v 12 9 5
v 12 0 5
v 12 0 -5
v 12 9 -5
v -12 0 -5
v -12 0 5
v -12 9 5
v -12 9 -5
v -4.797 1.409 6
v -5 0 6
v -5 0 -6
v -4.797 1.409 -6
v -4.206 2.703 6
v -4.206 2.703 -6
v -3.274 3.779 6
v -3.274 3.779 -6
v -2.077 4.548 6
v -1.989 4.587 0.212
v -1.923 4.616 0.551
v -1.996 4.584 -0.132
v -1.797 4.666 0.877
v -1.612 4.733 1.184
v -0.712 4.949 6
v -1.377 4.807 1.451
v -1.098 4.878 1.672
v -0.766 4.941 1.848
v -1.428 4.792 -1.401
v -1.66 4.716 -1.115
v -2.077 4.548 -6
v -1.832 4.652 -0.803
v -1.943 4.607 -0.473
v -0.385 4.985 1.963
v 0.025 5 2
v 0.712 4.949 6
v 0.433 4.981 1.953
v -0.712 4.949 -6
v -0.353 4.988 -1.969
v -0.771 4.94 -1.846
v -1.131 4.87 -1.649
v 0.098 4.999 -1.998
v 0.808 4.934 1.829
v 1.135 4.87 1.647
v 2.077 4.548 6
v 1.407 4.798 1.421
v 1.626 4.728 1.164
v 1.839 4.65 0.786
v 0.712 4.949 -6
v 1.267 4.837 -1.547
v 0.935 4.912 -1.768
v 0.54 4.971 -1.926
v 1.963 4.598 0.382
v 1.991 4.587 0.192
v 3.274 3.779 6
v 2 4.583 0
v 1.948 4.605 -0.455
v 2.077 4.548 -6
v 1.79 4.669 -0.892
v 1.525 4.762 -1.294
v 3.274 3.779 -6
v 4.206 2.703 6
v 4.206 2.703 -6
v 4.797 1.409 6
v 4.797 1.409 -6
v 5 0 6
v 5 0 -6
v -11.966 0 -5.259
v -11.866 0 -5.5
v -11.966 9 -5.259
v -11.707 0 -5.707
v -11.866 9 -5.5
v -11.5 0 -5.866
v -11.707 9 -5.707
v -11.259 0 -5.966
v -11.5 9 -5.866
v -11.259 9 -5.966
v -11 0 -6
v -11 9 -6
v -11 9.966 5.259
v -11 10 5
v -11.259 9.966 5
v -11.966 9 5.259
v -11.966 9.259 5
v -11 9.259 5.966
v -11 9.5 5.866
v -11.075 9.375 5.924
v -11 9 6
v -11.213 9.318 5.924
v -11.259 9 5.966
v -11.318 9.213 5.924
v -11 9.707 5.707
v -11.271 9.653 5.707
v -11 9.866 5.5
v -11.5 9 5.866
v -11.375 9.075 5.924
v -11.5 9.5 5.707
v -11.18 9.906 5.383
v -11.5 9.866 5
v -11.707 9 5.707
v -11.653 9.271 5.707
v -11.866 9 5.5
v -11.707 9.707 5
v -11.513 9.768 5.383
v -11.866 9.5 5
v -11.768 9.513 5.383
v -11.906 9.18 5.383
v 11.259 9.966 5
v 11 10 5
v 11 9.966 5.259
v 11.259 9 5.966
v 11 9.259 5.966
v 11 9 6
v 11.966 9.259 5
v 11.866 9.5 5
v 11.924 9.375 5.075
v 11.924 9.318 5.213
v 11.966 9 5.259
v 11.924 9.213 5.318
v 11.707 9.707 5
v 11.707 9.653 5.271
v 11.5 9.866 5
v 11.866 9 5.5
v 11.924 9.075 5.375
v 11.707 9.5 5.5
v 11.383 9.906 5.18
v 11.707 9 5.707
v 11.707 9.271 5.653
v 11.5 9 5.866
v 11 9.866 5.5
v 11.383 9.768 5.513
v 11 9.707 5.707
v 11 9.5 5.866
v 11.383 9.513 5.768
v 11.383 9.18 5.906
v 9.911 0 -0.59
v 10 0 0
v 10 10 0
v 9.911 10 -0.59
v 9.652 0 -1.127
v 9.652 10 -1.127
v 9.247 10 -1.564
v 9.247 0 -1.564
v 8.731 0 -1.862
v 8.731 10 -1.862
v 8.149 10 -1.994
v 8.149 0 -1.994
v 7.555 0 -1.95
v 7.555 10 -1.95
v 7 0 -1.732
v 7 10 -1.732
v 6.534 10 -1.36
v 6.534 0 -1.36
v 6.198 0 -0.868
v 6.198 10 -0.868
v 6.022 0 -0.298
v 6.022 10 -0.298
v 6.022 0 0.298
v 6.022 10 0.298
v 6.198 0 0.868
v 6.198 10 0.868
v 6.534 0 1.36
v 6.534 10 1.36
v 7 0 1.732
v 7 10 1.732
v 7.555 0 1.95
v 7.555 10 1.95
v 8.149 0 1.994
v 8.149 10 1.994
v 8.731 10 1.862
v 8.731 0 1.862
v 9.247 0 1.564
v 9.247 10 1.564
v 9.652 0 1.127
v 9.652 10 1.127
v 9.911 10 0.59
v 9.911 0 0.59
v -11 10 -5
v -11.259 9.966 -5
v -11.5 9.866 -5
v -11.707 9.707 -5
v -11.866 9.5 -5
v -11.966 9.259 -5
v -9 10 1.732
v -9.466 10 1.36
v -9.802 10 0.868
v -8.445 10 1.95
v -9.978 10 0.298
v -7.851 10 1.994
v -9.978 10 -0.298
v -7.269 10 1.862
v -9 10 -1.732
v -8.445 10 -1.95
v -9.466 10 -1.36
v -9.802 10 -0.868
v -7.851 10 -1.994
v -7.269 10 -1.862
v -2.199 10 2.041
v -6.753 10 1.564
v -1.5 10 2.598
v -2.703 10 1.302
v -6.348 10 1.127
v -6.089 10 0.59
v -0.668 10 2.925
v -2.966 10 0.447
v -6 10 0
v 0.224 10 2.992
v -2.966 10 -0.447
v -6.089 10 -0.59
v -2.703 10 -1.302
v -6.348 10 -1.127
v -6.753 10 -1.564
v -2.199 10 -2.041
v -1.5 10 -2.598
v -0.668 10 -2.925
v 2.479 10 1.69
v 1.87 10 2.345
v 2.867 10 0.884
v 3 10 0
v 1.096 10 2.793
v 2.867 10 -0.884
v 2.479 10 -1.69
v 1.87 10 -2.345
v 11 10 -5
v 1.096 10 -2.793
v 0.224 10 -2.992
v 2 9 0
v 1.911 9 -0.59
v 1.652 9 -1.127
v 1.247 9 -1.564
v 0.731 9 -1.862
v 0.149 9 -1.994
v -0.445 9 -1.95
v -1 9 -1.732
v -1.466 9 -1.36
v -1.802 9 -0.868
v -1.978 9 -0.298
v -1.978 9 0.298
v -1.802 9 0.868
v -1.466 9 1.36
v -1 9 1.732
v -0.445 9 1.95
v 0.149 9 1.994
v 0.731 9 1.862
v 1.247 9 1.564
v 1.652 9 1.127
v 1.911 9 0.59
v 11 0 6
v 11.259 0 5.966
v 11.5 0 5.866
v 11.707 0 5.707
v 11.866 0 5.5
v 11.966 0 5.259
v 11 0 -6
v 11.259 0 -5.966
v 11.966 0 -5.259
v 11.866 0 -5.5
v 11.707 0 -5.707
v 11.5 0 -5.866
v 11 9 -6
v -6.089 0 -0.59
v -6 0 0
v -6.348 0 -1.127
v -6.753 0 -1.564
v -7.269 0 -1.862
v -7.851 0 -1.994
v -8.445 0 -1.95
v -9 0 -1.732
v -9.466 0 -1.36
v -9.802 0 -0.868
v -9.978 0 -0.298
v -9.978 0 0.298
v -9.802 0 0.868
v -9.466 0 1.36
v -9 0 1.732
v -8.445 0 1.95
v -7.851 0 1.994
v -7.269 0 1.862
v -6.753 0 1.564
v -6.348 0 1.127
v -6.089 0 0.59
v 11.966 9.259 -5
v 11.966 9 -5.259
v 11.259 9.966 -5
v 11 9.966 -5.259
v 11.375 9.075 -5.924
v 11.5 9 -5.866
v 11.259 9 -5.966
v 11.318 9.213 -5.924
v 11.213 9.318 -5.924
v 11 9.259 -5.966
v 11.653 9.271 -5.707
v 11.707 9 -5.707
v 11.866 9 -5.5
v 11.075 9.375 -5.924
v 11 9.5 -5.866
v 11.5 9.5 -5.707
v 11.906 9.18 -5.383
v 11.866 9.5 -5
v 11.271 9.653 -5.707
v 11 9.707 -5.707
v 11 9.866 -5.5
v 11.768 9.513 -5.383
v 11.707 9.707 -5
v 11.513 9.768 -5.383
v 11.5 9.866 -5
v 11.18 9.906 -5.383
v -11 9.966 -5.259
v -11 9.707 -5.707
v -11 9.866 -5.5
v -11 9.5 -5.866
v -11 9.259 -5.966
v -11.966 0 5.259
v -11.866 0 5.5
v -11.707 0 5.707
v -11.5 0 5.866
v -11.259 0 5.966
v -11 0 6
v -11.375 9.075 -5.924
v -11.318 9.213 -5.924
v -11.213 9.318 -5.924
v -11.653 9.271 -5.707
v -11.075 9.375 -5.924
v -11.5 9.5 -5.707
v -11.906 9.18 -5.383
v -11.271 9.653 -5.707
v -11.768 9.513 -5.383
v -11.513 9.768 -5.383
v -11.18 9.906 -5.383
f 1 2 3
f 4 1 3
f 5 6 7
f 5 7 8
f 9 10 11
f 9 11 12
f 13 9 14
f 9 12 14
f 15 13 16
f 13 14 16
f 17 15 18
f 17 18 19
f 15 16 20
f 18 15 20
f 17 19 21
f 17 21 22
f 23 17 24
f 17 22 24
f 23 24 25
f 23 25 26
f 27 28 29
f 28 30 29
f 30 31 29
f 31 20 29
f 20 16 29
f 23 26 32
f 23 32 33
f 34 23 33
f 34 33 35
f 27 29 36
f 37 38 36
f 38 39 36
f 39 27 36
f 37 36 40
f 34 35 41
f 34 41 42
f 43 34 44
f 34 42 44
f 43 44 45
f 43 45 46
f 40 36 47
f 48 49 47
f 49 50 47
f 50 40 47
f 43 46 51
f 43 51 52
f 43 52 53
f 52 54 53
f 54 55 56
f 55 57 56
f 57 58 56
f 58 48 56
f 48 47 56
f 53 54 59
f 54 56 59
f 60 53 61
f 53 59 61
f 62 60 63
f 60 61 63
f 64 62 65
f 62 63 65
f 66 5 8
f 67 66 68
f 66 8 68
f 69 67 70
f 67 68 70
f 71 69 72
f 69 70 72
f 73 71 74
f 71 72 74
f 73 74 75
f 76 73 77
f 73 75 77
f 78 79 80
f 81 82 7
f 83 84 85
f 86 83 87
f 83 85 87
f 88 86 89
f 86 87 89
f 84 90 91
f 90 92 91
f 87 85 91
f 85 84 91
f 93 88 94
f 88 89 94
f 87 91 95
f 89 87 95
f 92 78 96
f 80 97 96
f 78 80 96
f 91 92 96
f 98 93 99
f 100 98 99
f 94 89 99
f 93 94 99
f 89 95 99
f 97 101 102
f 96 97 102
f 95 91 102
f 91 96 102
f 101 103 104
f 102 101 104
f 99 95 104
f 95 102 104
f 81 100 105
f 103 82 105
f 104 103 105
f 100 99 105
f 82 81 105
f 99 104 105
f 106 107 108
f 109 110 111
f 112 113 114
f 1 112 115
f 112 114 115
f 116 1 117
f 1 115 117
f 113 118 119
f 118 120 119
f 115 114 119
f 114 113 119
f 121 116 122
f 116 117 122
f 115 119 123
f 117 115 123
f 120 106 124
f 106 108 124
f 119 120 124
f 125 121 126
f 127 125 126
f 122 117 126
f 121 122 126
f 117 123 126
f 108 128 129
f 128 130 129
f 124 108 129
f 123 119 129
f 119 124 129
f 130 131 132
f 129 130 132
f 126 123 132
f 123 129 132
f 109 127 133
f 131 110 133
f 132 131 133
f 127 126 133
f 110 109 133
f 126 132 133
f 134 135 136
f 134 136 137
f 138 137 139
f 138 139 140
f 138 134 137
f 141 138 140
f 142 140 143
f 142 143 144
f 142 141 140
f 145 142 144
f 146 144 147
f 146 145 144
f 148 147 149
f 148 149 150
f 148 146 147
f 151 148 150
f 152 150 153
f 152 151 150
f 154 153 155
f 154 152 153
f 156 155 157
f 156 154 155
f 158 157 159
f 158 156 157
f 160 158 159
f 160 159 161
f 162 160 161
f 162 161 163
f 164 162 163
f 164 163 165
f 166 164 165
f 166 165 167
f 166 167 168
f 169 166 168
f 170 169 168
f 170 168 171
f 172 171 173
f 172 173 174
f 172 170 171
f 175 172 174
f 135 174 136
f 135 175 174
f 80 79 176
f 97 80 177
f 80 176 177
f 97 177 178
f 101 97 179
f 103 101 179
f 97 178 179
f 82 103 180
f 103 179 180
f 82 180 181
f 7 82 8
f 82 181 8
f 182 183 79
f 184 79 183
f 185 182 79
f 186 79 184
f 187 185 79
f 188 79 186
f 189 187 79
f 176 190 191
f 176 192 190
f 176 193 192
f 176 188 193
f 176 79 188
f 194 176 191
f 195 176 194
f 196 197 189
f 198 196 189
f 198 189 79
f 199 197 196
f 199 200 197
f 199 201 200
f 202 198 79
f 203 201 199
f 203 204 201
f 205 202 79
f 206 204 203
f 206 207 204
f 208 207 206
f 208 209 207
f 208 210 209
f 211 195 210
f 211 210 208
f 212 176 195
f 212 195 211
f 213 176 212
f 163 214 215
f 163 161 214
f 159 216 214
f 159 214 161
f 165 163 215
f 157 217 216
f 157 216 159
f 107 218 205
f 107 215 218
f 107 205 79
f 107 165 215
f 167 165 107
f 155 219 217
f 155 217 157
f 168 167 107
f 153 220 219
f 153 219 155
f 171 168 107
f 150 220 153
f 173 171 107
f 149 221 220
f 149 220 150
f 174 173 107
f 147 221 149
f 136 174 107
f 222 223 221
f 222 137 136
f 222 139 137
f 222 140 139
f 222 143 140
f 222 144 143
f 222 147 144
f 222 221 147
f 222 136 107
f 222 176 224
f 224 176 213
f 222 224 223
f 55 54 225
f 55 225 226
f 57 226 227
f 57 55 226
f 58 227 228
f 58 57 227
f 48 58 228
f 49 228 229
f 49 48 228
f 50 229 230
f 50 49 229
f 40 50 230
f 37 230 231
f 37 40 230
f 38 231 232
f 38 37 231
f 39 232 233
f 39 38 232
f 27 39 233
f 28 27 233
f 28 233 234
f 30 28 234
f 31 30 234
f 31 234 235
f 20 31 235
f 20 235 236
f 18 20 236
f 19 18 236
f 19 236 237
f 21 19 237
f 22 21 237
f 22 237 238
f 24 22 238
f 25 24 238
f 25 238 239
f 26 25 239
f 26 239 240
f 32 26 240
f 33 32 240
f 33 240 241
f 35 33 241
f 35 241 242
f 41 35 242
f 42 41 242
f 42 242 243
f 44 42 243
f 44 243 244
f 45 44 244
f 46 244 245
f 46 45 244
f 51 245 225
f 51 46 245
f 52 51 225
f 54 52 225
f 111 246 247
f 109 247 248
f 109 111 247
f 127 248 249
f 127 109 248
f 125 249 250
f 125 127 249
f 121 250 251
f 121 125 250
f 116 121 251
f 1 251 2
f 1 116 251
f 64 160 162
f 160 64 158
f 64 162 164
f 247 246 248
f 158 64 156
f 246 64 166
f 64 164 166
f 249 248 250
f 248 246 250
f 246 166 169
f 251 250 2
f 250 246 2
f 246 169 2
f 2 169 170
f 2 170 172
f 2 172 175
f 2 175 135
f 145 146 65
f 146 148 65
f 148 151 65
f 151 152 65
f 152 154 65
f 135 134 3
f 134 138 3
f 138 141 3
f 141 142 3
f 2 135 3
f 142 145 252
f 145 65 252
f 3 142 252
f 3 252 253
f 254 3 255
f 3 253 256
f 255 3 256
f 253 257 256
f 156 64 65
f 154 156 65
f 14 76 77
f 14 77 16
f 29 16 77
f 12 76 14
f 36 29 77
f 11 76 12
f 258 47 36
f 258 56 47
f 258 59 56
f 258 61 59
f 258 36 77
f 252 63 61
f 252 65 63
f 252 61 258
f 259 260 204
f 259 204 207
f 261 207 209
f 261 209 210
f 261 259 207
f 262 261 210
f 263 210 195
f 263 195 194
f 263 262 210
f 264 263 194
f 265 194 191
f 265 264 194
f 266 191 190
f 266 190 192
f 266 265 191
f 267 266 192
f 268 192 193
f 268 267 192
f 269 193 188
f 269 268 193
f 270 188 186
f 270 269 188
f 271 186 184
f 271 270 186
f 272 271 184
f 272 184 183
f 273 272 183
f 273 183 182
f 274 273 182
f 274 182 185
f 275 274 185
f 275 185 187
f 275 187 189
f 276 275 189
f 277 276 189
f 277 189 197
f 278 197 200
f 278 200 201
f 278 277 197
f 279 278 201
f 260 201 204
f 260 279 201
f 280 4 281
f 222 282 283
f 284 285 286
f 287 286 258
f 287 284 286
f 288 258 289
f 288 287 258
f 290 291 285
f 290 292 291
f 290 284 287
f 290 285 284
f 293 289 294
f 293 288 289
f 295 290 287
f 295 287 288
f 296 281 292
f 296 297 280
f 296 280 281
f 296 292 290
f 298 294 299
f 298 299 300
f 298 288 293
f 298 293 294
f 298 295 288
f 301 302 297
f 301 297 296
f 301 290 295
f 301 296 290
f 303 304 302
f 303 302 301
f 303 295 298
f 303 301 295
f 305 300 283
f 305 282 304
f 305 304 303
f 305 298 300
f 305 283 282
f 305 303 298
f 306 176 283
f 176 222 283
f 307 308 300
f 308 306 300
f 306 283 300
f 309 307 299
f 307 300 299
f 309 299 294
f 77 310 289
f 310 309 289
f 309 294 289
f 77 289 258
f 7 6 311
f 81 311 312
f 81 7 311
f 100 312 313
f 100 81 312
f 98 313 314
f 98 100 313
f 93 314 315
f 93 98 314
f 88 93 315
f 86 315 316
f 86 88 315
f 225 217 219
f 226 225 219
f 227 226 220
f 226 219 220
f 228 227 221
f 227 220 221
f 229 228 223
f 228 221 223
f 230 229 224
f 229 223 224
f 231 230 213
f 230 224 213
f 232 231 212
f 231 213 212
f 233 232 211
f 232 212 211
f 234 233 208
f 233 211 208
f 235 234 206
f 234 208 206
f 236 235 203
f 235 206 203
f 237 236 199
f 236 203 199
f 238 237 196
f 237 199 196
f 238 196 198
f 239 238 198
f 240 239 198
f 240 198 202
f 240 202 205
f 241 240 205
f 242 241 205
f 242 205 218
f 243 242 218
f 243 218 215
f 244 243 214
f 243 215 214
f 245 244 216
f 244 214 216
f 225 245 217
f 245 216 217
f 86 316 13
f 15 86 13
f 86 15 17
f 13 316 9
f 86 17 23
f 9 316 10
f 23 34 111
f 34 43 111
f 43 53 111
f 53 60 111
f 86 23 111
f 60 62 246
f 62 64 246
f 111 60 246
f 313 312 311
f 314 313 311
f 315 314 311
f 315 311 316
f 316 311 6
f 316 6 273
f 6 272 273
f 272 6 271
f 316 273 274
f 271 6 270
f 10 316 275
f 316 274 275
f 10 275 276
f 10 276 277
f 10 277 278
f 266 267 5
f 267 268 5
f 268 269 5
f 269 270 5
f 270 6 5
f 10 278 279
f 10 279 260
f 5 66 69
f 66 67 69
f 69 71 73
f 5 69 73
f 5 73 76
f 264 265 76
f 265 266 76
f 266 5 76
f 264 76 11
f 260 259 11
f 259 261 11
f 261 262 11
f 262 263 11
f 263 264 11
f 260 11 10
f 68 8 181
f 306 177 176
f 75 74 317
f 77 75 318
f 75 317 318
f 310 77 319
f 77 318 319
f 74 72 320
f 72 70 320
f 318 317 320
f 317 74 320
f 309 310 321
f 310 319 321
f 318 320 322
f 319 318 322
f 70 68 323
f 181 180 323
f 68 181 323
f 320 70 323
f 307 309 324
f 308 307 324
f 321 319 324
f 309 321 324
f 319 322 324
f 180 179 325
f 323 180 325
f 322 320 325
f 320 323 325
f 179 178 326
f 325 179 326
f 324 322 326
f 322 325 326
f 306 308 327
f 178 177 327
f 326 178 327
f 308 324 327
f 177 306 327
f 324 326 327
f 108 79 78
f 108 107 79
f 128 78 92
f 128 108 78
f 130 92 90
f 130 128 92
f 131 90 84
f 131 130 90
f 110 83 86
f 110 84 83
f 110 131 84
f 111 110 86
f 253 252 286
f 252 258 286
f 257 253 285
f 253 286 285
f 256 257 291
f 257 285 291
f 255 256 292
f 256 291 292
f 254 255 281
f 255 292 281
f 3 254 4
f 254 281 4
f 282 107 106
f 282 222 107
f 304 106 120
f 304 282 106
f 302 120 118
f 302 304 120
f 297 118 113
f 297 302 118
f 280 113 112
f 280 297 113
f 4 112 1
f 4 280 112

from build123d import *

# Parameters (mm, degrees)
SKETCH1_W           = 24
SKETCH1_H           = 12
SKETCH1_R           = 2
BOSS_EXTRUDE1_DEPTH = 10
CHAMFER1_SIZE       = 1
FILLET1_R           = 1
CUT_EXTRUDE1_DEPTH  = 13


with BuildPart() as part:
    # Sketch1 → Boss-Extrude1 (new body)
    with BuildSketch(Plane(origin=(0, 0, 0), x_dir=(1, 0, 0), z_dir=(0, 1, 0))):
        Rectangle(SKETCH1_W, SKETCH1_H)
        with Locations((8, 0)):
            Circle(SKETCH1_R, mode=Mode.SUBTRACT)
        with Locations((-8, 0)):
            Circle(SKETCH1_R, mode=Mode.SUBTRACT)
        Circle(SKETCH1_R, mode=Mode.SUBTRACT)
    extrude(amount=BOSS_EXTRUDE1_DEPTH)

    # Chamfer1
    chamfer1_edges = [part.edges().sort_by_distance(p)[0] for p in [
        (-2, 10, 0),
    ]]
    chamfer(chamfer1_edges, length=CHAMFER1_SIZE)

    # Fillet1
    fillet1_edges = [part.edges().sort_by_distance(p)[0] for p in [
        (-12, 10, 0),
        (0, 10, 6),
        (12, 10, 0),
        (12, 5, 6),
        (-12, 5, 6),
        (-12, 5, -6),
        (12, 5, -6),
        (0, 10, -6),
    ]]
    fillet(fillet1_edges, radius=FILLET1_R)

    # Sketch2 → Cut-Extrude1 (cut, through all)
    with BuildSketch(Plane(origin=(0, 0, -6), x_dir=(-1, 0, 0), z_dir=(0, 0, -1))):
        with BuildLine():
            Line((-5, 0), (5, 0))
            ThreePointArc((5, 0), (0, 5), (-5, 0))
        make_face()
    extrude(amount=-CUT_EXTRUDE1_DEPTH, mode=Mode.SUBTRACT)


solid = part.part
